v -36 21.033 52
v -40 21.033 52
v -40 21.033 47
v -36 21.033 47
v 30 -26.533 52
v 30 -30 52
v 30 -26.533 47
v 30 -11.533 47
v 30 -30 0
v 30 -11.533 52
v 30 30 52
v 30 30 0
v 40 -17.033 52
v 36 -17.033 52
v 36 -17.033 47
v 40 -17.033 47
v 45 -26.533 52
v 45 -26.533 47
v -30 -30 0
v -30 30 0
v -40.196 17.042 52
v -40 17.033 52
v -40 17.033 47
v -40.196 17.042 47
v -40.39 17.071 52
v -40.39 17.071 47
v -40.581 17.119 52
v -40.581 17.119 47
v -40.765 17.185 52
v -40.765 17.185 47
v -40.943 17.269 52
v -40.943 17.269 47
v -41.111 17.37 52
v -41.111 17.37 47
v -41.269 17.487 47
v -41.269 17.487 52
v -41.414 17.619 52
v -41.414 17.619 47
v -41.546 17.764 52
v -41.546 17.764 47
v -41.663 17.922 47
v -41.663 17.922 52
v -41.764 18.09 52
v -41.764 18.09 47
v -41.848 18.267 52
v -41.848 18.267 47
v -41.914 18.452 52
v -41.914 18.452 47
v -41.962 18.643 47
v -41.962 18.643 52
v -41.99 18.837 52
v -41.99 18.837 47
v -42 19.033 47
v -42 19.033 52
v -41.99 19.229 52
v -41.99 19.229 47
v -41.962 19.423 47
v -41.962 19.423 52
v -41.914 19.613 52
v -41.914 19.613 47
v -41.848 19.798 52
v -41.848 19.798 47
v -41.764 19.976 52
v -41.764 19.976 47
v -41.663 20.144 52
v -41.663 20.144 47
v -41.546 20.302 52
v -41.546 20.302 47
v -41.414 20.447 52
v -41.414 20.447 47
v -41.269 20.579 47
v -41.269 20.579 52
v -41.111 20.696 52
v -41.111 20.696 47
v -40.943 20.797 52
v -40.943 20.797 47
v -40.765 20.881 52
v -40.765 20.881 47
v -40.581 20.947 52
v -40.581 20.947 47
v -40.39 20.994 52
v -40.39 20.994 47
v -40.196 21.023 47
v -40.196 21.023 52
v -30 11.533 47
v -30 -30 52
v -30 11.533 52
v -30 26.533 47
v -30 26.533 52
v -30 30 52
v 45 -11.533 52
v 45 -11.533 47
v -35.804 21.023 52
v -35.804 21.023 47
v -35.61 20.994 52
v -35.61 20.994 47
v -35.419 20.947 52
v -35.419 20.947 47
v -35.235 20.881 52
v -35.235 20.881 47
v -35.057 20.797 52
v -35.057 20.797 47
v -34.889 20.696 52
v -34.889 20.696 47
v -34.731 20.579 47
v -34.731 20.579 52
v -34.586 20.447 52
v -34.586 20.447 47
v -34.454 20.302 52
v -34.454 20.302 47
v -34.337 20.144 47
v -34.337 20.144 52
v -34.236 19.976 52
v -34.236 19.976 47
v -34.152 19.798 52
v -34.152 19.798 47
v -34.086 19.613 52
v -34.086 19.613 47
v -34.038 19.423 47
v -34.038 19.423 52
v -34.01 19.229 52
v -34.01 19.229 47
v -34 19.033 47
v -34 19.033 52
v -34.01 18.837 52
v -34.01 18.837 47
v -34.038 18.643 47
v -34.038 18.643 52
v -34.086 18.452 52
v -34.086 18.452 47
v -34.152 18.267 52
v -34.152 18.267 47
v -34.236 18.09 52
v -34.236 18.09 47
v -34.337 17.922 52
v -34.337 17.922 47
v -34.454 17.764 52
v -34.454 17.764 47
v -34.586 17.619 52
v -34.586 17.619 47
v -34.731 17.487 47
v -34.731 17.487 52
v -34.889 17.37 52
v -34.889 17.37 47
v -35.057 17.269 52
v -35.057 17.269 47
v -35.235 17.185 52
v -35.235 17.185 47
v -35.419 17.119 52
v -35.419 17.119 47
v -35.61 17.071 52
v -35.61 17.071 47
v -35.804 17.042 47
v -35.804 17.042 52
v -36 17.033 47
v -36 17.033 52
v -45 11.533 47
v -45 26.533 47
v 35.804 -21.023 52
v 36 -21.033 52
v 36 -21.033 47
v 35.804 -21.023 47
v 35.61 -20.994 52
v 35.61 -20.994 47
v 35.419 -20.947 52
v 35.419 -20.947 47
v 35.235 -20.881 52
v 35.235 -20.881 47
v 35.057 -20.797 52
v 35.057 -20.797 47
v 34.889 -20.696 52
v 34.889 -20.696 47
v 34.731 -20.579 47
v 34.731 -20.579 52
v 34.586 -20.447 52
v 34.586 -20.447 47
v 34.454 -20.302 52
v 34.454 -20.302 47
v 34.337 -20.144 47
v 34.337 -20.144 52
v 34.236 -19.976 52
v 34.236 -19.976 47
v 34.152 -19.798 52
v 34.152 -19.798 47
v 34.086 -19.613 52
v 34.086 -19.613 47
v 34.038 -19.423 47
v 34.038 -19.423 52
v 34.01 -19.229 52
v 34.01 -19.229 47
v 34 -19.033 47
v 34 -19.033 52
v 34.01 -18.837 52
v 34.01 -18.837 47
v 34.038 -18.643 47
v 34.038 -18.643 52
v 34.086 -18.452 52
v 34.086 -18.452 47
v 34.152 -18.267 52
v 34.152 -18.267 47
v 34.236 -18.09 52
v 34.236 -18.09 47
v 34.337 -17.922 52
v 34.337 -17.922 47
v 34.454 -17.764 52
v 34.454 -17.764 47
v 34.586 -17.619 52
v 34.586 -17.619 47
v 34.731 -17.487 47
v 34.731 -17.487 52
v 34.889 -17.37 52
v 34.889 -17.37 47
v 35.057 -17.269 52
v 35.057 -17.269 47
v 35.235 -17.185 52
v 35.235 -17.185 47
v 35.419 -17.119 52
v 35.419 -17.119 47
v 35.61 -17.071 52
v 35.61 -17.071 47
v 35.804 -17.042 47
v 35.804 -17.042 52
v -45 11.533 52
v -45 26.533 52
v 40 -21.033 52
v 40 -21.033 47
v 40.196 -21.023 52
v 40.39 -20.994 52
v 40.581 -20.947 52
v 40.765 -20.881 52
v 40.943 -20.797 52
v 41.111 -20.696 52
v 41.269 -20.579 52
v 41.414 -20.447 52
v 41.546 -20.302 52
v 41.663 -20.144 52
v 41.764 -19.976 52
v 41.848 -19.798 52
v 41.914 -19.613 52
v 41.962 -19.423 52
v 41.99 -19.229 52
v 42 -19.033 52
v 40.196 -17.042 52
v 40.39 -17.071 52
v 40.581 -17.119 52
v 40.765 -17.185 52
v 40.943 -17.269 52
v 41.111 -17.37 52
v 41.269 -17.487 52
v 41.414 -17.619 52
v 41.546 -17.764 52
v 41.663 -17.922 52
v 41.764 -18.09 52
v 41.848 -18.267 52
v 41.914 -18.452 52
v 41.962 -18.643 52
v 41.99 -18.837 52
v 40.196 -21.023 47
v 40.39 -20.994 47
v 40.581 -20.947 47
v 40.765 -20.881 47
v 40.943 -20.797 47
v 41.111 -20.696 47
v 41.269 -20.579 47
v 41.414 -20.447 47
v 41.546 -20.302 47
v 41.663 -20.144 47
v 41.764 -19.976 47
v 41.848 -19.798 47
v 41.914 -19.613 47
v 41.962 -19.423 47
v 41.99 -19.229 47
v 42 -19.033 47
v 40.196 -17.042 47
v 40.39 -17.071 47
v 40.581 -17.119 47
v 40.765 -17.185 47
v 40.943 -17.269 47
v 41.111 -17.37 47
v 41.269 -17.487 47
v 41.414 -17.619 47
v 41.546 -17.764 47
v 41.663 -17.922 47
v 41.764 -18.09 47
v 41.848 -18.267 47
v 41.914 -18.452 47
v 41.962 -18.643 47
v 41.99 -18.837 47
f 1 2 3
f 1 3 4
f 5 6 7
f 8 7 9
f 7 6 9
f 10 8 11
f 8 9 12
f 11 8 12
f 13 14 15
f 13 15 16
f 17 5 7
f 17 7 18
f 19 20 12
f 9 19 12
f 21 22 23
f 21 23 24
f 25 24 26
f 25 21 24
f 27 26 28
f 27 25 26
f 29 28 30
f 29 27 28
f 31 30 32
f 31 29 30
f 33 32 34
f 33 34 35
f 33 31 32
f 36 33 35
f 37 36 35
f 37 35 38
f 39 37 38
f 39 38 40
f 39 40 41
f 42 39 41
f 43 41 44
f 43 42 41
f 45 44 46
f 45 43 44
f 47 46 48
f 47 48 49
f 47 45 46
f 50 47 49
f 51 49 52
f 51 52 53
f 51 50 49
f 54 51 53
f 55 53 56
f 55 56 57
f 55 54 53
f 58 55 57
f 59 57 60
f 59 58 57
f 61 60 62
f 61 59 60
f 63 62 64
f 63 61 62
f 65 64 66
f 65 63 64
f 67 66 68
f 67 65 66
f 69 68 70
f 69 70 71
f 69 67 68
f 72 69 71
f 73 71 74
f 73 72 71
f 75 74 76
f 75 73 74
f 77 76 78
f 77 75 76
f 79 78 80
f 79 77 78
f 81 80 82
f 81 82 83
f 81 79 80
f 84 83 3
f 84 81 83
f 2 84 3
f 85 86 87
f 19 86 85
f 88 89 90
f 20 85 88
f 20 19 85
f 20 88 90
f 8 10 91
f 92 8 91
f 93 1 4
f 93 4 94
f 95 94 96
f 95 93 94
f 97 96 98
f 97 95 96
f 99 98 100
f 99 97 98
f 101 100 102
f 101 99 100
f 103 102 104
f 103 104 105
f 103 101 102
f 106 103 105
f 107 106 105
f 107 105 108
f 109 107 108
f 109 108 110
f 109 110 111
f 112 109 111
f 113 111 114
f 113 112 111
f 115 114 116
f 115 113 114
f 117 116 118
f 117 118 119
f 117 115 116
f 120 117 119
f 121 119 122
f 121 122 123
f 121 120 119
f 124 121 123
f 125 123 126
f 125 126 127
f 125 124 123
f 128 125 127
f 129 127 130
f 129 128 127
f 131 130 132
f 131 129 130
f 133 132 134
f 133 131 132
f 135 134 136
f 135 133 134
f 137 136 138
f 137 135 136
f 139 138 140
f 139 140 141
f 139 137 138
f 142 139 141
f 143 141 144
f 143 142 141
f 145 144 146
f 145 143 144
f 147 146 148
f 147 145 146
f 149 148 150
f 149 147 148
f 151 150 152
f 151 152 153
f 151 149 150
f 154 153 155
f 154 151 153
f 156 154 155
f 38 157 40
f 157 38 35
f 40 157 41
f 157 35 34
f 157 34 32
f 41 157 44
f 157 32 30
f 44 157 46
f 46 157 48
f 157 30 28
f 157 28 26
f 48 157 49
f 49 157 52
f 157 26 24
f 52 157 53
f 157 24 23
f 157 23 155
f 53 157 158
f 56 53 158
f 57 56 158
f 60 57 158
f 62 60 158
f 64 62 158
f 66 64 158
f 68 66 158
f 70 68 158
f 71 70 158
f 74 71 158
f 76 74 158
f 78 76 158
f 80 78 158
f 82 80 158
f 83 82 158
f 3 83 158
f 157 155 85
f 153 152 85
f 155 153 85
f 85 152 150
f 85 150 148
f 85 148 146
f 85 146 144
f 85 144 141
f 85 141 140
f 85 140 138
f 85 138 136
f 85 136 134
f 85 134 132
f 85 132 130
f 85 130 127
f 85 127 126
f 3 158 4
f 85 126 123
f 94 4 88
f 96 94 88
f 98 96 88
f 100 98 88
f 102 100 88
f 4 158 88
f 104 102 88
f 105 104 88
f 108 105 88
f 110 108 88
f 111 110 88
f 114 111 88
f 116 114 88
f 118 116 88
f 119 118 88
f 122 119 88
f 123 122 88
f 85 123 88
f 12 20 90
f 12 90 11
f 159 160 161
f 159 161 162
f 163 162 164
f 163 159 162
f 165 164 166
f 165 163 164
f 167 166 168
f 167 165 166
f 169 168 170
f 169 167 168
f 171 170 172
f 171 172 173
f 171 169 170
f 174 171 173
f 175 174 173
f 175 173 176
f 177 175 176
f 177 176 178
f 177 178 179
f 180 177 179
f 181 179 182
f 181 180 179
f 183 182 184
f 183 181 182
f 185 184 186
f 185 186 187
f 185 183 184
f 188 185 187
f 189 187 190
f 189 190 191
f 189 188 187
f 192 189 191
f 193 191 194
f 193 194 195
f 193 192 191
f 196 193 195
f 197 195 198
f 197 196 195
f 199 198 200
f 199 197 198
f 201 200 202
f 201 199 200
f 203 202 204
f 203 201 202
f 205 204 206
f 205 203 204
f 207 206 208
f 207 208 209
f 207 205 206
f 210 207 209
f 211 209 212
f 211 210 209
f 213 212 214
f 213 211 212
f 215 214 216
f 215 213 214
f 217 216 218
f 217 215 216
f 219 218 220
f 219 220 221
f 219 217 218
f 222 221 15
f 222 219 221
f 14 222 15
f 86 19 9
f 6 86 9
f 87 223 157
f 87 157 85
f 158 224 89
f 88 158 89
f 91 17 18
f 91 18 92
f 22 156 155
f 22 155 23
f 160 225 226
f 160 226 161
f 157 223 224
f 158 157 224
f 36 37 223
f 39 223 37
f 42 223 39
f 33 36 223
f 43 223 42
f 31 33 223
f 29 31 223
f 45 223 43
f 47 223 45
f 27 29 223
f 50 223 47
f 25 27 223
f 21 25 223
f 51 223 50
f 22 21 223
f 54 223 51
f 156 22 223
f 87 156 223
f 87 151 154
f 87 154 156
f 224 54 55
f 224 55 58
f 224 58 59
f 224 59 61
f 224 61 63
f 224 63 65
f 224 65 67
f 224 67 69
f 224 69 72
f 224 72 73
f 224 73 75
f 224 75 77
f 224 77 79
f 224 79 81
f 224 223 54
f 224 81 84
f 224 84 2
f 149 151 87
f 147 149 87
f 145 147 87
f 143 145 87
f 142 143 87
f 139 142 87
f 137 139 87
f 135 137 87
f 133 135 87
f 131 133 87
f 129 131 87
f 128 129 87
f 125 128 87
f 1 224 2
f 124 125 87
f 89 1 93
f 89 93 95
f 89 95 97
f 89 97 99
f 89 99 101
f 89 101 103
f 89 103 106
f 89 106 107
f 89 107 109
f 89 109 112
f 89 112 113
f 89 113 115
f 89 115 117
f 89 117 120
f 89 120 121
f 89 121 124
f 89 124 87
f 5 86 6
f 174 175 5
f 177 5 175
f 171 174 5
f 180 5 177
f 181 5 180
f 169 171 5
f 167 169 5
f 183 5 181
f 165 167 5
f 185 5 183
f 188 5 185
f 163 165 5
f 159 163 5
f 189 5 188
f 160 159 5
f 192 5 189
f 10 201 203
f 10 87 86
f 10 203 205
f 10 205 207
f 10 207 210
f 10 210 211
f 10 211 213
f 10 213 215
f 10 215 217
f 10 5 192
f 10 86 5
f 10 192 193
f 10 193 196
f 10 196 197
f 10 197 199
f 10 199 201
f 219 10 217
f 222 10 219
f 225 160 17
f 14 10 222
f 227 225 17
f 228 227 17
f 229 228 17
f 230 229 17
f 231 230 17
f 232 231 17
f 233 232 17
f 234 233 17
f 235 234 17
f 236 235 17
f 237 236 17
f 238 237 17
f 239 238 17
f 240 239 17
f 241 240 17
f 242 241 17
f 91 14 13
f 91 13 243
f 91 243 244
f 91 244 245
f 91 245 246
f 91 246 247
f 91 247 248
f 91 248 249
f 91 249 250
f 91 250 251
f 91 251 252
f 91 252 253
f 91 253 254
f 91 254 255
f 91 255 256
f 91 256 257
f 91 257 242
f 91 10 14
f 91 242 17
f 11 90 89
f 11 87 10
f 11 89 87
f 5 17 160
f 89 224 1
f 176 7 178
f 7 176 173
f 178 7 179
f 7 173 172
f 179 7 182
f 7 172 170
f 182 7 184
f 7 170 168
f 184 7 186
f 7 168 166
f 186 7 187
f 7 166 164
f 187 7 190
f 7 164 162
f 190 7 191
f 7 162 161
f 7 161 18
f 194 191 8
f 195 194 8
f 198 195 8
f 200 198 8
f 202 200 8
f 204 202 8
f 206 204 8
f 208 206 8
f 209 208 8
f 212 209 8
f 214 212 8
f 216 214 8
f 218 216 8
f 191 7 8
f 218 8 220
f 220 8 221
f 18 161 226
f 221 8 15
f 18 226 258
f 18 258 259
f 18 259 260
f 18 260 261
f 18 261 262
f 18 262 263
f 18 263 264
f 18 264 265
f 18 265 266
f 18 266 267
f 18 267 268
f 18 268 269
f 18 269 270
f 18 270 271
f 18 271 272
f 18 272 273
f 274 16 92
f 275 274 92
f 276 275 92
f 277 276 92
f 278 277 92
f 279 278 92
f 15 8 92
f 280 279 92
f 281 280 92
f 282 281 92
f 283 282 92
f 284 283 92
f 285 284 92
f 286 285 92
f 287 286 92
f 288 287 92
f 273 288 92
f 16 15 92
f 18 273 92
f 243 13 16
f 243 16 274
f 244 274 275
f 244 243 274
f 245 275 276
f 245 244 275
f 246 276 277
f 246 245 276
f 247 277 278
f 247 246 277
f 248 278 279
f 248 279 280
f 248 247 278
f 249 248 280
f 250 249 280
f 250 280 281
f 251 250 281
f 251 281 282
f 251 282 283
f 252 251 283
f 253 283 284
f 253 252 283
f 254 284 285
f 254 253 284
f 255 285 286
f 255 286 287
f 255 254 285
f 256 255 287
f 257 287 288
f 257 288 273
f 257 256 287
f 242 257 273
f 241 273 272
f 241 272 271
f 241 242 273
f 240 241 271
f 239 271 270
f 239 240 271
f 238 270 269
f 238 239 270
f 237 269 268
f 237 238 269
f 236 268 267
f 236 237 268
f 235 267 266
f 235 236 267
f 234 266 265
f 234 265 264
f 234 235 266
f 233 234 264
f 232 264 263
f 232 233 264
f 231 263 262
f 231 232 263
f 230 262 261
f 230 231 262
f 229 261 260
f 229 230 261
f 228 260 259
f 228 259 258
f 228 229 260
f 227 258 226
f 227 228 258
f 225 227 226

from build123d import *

# Parameters (mm, degrees)
SKETCH_1_W      = 60
SKETCH_1_H      = 60
EXTRUDE_1_DEPTH = 52
SKETCH_2_W      = 15
SKETCH_2_H      = 15
EXTRUDE_2_DEPTH = 5


with BuildPart() as part:
    # 草图1 → 凸台-拉伸1 (new body)
    with BuildSketch(Plane.XY):
        Rectangle(SKETCH_1_W, SKETCH_1_H)
    extrude(amount=EXTRUDE_1_DEPTH)

    # 草图2 → 凸台-拉伸2 (add)
    # profile 1 of 2: a face of its own
    with BuildSketch(Plane.XY.offset(52)):
        with Locations((-37.5, 19.032866311)):
            Rectangle(SKETCH_2_W, SKETCH_2_H)
        with BuildLine():
            Line((-40, 21.032866311), (-36, 21.032866311))
            ThreePointArc((-36, 21.032866311), (-34, 19.032866311), (-36, 17.032866311))
            Line((-36, 17.032866311), (-40, 17.032866311))
            ThreePointArc((-40, 17.032866311), (-42, 19.032866311), (-40, 21.032866311))
        make_face(mode=Mode.SUBTRACT)
    # profile 2 of 2: a face of its own
    with BuildSketch(Plane.XY.offset(52)):
        with Locations((37.5, -19.032866311)):
            Rectangle(SKETCH_2_W, SKETCH_2_H)
        with BuildLine():
            Line((40, -21.032866311), (36, -21.032866311))
            ThreePointArc((36, -21.032866311), (34, -19.032866311), (36, -17.032866311))
            Line((36, -17.032866311), (40, -17.032866311))
            ThreePointArc((40, -17.032866311), (42, -19.032866311), (40, -21.032866311))
        make_face(mode=Mode.SUBTRACT)
    extrude(amount=-EXTRUDE_2_DEPTH)


solid = part.part
